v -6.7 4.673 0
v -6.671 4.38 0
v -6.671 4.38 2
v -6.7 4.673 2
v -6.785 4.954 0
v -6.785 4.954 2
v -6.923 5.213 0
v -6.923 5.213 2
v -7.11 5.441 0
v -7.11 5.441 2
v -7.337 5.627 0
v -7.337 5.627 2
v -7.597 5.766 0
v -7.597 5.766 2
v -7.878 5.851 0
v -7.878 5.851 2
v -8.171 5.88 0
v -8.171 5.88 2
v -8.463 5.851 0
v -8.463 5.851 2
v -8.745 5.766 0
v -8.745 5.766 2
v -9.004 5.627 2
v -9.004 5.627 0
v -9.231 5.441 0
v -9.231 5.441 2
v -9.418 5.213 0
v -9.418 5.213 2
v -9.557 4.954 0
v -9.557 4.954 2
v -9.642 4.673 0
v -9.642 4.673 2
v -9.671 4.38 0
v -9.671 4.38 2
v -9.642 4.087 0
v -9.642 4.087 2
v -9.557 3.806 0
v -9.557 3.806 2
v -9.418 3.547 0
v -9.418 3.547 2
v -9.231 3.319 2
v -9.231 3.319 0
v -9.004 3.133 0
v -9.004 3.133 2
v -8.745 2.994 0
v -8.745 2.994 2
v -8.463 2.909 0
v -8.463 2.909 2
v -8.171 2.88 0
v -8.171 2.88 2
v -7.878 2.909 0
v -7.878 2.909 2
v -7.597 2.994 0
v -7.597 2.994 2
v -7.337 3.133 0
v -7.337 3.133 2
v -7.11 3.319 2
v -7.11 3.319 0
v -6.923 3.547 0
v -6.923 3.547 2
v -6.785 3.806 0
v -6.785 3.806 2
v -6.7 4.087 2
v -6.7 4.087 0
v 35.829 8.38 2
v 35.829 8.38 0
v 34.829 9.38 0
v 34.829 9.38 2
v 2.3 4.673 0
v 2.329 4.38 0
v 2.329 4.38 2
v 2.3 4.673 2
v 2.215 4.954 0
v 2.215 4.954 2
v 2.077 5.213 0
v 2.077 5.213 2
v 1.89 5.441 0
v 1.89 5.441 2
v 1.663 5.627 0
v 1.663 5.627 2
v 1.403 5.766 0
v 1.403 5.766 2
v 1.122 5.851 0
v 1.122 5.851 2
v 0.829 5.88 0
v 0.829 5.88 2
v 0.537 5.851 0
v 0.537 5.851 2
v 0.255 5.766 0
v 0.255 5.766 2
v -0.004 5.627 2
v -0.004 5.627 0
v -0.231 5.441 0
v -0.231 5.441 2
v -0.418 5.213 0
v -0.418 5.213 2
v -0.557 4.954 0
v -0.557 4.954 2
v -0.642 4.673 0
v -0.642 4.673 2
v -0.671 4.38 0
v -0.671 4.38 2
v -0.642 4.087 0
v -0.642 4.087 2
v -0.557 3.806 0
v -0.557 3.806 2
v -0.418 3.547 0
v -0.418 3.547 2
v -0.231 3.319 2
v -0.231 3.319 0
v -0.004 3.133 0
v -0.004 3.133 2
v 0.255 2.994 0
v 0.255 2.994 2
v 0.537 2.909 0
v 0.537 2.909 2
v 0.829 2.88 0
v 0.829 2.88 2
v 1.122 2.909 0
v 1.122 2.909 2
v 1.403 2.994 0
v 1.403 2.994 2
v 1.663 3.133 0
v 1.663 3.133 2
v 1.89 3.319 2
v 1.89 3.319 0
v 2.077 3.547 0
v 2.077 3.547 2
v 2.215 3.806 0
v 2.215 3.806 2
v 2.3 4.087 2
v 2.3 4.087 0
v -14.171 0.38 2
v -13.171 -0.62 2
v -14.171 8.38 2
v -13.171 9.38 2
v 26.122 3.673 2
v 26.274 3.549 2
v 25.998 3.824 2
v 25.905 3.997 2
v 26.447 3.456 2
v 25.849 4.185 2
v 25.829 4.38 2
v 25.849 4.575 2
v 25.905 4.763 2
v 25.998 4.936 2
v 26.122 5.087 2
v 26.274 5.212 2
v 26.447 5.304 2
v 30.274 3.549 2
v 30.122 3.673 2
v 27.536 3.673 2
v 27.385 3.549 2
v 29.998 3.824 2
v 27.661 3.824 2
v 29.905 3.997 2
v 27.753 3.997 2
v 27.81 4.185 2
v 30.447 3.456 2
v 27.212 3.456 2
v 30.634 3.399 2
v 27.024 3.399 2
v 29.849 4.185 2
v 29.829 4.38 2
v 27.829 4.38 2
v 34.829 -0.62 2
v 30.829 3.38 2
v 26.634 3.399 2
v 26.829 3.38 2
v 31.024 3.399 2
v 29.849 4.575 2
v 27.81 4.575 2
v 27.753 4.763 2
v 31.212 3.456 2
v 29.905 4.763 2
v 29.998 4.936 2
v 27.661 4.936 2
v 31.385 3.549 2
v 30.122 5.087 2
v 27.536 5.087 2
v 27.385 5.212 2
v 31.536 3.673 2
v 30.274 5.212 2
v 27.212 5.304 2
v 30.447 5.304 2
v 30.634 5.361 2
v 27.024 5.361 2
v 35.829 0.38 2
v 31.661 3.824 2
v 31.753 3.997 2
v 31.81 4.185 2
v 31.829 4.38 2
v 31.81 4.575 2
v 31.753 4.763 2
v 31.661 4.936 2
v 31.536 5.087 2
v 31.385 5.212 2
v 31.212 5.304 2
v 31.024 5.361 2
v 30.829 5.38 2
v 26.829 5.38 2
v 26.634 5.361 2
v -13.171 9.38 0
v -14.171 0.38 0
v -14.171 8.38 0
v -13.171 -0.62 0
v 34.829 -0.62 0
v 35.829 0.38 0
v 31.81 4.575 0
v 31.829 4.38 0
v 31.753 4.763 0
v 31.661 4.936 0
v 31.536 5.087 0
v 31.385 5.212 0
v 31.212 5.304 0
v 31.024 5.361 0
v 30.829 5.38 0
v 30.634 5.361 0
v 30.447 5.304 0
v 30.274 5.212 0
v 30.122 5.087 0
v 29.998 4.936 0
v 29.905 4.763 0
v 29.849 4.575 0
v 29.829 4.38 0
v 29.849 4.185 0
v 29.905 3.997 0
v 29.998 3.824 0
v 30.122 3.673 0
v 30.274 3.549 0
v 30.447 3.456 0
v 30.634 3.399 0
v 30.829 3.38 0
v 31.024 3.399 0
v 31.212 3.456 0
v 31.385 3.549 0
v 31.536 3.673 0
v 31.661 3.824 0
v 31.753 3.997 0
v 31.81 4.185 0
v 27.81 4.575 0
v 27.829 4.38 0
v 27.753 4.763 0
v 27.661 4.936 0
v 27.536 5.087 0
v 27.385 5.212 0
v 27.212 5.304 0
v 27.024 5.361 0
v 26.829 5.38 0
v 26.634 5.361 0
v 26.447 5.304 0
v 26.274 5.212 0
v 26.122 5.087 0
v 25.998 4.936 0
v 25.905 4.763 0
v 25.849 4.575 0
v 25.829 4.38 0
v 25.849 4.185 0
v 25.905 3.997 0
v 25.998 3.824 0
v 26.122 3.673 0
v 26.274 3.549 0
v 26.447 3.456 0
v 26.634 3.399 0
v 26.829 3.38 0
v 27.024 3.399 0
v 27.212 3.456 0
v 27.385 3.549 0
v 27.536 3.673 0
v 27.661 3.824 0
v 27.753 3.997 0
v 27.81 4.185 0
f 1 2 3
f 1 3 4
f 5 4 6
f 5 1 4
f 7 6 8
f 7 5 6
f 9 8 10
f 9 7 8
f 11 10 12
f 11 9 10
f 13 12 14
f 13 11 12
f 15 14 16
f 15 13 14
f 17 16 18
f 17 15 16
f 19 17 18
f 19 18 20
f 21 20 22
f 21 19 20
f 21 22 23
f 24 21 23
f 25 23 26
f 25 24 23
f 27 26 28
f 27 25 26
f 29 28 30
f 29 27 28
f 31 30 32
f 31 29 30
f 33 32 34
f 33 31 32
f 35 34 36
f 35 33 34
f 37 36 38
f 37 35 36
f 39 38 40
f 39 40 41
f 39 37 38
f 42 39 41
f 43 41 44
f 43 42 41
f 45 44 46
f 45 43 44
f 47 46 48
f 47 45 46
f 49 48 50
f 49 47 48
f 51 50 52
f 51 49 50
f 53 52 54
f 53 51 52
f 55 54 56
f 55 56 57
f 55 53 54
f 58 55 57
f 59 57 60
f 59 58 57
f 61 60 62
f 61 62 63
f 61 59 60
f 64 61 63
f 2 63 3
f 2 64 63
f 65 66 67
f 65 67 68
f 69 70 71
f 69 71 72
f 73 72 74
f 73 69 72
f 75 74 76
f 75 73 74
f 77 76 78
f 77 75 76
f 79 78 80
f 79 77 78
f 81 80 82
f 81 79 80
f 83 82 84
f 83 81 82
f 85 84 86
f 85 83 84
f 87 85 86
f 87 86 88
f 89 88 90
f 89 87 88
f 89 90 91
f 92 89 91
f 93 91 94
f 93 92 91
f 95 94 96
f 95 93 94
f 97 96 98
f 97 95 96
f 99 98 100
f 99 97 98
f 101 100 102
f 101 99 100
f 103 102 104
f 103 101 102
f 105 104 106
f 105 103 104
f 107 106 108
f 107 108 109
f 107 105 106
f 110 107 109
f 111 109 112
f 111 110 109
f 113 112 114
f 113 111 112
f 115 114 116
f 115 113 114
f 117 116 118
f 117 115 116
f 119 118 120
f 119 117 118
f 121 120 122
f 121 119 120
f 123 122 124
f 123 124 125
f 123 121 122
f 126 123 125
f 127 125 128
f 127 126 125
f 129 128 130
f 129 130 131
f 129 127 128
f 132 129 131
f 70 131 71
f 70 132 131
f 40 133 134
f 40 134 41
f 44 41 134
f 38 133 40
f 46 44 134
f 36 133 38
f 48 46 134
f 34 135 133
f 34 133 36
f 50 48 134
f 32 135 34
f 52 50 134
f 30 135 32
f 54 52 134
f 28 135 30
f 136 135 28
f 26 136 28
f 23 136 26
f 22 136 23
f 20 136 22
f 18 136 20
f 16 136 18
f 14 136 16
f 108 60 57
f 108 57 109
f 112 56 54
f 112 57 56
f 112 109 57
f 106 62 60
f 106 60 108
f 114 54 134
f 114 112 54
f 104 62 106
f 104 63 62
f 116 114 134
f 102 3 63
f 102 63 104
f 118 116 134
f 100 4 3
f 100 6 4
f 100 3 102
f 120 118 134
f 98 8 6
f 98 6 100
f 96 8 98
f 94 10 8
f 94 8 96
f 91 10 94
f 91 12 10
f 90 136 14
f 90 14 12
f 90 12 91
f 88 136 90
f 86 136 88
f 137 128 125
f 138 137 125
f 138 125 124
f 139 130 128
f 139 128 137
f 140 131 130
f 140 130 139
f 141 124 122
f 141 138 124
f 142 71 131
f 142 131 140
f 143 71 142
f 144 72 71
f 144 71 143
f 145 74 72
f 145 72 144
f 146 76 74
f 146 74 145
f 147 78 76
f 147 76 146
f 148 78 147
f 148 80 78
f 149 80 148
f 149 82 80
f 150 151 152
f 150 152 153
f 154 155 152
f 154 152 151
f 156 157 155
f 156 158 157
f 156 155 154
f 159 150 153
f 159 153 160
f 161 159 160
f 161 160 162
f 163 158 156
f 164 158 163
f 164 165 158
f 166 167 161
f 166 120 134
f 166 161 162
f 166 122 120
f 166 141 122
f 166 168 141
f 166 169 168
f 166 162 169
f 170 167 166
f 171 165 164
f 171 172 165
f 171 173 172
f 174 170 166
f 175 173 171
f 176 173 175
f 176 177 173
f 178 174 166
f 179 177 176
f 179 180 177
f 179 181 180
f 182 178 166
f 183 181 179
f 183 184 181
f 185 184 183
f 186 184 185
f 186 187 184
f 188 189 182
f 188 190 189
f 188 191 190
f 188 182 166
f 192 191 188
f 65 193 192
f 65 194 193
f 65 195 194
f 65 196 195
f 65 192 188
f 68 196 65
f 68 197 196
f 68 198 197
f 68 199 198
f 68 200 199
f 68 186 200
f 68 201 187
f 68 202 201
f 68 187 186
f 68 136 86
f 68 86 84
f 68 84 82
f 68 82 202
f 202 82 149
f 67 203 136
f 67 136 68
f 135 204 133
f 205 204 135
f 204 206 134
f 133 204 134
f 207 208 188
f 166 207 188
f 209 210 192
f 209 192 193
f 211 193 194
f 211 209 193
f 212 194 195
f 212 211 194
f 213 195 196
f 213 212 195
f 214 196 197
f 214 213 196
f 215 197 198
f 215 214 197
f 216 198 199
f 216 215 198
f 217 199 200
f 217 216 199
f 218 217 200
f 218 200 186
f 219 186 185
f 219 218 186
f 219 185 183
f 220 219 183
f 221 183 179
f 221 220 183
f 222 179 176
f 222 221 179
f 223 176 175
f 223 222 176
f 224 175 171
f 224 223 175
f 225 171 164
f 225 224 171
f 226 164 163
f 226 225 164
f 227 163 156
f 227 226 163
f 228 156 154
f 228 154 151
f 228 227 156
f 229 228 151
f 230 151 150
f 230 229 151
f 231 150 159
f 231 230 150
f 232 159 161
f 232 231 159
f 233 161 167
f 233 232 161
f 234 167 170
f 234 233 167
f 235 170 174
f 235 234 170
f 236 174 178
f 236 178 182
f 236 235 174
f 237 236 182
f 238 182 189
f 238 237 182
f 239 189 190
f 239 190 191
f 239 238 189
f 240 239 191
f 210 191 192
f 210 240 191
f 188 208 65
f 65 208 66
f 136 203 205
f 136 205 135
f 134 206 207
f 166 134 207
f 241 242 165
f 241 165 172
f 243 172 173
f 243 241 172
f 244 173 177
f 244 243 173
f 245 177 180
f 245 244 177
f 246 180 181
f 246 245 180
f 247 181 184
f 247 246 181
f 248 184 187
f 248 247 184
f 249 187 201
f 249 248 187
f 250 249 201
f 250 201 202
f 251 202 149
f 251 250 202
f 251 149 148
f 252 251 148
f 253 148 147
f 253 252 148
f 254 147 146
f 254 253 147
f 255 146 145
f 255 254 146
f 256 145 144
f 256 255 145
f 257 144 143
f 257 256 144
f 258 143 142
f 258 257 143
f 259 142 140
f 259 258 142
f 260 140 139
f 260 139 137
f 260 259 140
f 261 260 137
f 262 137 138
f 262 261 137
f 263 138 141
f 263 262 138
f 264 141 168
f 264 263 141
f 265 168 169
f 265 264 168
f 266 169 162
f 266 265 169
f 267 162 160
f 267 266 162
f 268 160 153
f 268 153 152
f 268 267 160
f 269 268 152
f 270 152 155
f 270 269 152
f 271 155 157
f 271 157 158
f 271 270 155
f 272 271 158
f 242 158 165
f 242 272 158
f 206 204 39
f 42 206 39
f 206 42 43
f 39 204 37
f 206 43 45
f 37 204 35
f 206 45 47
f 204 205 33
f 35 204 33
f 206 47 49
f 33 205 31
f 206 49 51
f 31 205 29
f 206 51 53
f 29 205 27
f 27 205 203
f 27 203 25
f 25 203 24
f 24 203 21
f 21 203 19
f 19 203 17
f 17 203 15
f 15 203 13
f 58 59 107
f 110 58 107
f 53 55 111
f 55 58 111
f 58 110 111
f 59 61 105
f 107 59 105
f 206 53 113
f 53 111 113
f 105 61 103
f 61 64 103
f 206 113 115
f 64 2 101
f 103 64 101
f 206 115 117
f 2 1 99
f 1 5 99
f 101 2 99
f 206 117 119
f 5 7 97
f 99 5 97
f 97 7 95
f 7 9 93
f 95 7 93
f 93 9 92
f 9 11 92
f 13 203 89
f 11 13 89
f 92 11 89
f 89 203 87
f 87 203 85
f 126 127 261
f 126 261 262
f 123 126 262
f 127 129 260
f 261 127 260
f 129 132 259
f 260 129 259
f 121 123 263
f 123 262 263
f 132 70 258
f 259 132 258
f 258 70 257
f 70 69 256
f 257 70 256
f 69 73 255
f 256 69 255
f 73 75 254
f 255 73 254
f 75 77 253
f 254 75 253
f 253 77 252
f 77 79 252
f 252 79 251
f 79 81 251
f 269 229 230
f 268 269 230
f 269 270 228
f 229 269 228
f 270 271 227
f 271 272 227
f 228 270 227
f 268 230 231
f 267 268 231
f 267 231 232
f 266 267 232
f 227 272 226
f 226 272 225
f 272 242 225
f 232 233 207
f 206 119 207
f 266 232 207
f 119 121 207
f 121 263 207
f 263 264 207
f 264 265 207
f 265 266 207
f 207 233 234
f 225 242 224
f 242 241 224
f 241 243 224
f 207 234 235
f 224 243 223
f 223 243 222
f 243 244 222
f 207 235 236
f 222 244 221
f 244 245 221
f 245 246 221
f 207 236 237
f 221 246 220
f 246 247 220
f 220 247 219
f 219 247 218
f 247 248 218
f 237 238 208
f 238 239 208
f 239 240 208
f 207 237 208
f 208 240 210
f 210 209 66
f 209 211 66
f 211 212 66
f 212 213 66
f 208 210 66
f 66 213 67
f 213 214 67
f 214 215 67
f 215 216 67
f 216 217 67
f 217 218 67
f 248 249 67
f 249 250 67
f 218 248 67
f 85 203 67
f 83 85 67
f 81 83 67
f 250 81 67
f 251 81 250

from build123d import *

# Parameters (mm, degrees)
SKETCH1_W           = 50
SKETCH1_H           = 10
SKETCH1_R           = 1.5
SKETCH1_R_2         = 1
BOSS_EXTRUDE1_DEPTH = 2
CHAMFER1_SIZE       = 1


with BuildPart() as part:
    # Sketch1 → Boss-Extrude1 (new body)
    with BuildSketch(Plane.XY):
        with Locations((10.829307568, 4.380032206)):
            Rectangle(SKETCH1_W, SKETCH1_H)
        with Locations((-8.170692432, 4.380032206)):
            Circle(SKETCH1_R, mode=Mode.SUBTRACT)
        with Locations((0.829307568, 4.380032206)):
            Circle(SKETCH1_R, mode=Mode.SUBTRACT)
        with Locations((26.829307568, 4.380032206)):
            Circle(SKETCH1_R_2, mode=Mode.SUBTRACT)
        with Locations((30.829307568, 4.380032206)):
            Circle(SKETCH1_R_2, mode=Mode.SUBTRACT)
    extrude(amount=BOSS_EXTRUDE1_DEPTH)

    # Chamfer1
    chamfer1_edges = [part.edges().sort_by_distance(p)[0] for p in [
        (-14.170692432, 9.380032206, 1),
        (35.829307568, 9.380032206, 1),
        (35.829307568, -0.619967794, 1),
        (-14.170692432, -0.619967794, 1),
    ]]
    chamfer(chamfer1_edges, length=CHAMFER1_SIZE)


solid = part.part
